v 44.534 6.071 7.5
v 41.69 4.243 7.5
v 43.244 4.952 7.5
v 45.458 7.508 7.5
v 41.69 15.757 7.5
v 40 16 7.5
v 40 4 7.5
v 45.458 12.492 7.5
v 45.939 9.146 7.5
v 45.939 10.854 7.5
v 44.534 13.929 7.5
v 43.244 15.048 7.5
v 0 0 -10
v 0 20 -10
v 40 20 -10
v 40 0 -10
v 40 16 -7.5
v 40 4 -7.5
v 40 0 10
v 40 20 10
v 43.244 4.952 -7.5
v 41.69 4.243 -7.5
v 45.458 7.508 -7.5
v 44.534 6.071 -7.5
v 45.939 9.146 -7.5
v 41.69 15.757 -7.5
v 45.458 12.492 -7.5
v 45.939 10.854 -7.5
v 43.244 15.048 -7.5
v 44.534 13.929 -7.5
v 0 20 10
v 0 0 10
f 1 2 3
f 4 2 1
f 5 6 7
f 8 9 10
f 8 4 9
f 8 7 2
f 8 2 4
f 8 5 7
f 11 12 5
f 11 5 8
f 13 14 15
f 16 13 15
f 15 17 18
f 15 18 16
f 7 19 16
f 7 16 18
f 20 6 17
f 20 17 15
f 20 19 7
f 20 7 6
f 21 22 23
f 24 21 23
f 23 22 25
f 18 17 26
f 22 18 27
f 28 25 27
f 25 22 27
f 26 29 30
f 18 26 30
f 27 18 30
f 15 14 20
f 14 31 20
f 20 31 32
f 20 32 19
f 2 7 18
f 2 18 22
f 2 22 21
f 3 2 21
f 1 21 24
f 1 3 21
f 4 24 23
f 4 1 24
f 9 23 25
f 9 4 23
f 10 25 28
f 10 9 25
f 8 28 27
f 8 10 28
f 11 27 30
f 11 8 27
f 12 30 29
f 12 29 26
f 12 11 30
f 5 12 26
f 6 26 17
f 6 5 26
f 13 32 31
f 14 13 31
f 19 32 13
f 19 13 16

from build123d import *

# Parameters (mm, degrees)
SKETCH1_W           = 40
SKETCH1_H           = 20
BOSS_EXTRUDE1_DEPTH = 10
SKETCH2_R           = 6
BOSS_EXTRUDE2_DEPTH = 7.5


with BuildPart() as part:
    # Sketch1 → Boss-Extrude1 (new, symmetric)
    with BuildSketch(Plane.XY):
        with Locations((20, 10)):
            Rectangle(SKETCH1_W, SKETCH1_H)
    extrude(amount=BOSS_EXTRUDE1_DEPTH, both=True)

    # Sketch2 → Boss-Extrude2 (add, symmetric)
    with BuildSketch(Plane.XY):
        with Locations((40, 10)):
            Circle(SKETCH2_R)
    extrude(amount=BOSS_EXTRUDE2_DEPTH, both=True)


solid = part.part
